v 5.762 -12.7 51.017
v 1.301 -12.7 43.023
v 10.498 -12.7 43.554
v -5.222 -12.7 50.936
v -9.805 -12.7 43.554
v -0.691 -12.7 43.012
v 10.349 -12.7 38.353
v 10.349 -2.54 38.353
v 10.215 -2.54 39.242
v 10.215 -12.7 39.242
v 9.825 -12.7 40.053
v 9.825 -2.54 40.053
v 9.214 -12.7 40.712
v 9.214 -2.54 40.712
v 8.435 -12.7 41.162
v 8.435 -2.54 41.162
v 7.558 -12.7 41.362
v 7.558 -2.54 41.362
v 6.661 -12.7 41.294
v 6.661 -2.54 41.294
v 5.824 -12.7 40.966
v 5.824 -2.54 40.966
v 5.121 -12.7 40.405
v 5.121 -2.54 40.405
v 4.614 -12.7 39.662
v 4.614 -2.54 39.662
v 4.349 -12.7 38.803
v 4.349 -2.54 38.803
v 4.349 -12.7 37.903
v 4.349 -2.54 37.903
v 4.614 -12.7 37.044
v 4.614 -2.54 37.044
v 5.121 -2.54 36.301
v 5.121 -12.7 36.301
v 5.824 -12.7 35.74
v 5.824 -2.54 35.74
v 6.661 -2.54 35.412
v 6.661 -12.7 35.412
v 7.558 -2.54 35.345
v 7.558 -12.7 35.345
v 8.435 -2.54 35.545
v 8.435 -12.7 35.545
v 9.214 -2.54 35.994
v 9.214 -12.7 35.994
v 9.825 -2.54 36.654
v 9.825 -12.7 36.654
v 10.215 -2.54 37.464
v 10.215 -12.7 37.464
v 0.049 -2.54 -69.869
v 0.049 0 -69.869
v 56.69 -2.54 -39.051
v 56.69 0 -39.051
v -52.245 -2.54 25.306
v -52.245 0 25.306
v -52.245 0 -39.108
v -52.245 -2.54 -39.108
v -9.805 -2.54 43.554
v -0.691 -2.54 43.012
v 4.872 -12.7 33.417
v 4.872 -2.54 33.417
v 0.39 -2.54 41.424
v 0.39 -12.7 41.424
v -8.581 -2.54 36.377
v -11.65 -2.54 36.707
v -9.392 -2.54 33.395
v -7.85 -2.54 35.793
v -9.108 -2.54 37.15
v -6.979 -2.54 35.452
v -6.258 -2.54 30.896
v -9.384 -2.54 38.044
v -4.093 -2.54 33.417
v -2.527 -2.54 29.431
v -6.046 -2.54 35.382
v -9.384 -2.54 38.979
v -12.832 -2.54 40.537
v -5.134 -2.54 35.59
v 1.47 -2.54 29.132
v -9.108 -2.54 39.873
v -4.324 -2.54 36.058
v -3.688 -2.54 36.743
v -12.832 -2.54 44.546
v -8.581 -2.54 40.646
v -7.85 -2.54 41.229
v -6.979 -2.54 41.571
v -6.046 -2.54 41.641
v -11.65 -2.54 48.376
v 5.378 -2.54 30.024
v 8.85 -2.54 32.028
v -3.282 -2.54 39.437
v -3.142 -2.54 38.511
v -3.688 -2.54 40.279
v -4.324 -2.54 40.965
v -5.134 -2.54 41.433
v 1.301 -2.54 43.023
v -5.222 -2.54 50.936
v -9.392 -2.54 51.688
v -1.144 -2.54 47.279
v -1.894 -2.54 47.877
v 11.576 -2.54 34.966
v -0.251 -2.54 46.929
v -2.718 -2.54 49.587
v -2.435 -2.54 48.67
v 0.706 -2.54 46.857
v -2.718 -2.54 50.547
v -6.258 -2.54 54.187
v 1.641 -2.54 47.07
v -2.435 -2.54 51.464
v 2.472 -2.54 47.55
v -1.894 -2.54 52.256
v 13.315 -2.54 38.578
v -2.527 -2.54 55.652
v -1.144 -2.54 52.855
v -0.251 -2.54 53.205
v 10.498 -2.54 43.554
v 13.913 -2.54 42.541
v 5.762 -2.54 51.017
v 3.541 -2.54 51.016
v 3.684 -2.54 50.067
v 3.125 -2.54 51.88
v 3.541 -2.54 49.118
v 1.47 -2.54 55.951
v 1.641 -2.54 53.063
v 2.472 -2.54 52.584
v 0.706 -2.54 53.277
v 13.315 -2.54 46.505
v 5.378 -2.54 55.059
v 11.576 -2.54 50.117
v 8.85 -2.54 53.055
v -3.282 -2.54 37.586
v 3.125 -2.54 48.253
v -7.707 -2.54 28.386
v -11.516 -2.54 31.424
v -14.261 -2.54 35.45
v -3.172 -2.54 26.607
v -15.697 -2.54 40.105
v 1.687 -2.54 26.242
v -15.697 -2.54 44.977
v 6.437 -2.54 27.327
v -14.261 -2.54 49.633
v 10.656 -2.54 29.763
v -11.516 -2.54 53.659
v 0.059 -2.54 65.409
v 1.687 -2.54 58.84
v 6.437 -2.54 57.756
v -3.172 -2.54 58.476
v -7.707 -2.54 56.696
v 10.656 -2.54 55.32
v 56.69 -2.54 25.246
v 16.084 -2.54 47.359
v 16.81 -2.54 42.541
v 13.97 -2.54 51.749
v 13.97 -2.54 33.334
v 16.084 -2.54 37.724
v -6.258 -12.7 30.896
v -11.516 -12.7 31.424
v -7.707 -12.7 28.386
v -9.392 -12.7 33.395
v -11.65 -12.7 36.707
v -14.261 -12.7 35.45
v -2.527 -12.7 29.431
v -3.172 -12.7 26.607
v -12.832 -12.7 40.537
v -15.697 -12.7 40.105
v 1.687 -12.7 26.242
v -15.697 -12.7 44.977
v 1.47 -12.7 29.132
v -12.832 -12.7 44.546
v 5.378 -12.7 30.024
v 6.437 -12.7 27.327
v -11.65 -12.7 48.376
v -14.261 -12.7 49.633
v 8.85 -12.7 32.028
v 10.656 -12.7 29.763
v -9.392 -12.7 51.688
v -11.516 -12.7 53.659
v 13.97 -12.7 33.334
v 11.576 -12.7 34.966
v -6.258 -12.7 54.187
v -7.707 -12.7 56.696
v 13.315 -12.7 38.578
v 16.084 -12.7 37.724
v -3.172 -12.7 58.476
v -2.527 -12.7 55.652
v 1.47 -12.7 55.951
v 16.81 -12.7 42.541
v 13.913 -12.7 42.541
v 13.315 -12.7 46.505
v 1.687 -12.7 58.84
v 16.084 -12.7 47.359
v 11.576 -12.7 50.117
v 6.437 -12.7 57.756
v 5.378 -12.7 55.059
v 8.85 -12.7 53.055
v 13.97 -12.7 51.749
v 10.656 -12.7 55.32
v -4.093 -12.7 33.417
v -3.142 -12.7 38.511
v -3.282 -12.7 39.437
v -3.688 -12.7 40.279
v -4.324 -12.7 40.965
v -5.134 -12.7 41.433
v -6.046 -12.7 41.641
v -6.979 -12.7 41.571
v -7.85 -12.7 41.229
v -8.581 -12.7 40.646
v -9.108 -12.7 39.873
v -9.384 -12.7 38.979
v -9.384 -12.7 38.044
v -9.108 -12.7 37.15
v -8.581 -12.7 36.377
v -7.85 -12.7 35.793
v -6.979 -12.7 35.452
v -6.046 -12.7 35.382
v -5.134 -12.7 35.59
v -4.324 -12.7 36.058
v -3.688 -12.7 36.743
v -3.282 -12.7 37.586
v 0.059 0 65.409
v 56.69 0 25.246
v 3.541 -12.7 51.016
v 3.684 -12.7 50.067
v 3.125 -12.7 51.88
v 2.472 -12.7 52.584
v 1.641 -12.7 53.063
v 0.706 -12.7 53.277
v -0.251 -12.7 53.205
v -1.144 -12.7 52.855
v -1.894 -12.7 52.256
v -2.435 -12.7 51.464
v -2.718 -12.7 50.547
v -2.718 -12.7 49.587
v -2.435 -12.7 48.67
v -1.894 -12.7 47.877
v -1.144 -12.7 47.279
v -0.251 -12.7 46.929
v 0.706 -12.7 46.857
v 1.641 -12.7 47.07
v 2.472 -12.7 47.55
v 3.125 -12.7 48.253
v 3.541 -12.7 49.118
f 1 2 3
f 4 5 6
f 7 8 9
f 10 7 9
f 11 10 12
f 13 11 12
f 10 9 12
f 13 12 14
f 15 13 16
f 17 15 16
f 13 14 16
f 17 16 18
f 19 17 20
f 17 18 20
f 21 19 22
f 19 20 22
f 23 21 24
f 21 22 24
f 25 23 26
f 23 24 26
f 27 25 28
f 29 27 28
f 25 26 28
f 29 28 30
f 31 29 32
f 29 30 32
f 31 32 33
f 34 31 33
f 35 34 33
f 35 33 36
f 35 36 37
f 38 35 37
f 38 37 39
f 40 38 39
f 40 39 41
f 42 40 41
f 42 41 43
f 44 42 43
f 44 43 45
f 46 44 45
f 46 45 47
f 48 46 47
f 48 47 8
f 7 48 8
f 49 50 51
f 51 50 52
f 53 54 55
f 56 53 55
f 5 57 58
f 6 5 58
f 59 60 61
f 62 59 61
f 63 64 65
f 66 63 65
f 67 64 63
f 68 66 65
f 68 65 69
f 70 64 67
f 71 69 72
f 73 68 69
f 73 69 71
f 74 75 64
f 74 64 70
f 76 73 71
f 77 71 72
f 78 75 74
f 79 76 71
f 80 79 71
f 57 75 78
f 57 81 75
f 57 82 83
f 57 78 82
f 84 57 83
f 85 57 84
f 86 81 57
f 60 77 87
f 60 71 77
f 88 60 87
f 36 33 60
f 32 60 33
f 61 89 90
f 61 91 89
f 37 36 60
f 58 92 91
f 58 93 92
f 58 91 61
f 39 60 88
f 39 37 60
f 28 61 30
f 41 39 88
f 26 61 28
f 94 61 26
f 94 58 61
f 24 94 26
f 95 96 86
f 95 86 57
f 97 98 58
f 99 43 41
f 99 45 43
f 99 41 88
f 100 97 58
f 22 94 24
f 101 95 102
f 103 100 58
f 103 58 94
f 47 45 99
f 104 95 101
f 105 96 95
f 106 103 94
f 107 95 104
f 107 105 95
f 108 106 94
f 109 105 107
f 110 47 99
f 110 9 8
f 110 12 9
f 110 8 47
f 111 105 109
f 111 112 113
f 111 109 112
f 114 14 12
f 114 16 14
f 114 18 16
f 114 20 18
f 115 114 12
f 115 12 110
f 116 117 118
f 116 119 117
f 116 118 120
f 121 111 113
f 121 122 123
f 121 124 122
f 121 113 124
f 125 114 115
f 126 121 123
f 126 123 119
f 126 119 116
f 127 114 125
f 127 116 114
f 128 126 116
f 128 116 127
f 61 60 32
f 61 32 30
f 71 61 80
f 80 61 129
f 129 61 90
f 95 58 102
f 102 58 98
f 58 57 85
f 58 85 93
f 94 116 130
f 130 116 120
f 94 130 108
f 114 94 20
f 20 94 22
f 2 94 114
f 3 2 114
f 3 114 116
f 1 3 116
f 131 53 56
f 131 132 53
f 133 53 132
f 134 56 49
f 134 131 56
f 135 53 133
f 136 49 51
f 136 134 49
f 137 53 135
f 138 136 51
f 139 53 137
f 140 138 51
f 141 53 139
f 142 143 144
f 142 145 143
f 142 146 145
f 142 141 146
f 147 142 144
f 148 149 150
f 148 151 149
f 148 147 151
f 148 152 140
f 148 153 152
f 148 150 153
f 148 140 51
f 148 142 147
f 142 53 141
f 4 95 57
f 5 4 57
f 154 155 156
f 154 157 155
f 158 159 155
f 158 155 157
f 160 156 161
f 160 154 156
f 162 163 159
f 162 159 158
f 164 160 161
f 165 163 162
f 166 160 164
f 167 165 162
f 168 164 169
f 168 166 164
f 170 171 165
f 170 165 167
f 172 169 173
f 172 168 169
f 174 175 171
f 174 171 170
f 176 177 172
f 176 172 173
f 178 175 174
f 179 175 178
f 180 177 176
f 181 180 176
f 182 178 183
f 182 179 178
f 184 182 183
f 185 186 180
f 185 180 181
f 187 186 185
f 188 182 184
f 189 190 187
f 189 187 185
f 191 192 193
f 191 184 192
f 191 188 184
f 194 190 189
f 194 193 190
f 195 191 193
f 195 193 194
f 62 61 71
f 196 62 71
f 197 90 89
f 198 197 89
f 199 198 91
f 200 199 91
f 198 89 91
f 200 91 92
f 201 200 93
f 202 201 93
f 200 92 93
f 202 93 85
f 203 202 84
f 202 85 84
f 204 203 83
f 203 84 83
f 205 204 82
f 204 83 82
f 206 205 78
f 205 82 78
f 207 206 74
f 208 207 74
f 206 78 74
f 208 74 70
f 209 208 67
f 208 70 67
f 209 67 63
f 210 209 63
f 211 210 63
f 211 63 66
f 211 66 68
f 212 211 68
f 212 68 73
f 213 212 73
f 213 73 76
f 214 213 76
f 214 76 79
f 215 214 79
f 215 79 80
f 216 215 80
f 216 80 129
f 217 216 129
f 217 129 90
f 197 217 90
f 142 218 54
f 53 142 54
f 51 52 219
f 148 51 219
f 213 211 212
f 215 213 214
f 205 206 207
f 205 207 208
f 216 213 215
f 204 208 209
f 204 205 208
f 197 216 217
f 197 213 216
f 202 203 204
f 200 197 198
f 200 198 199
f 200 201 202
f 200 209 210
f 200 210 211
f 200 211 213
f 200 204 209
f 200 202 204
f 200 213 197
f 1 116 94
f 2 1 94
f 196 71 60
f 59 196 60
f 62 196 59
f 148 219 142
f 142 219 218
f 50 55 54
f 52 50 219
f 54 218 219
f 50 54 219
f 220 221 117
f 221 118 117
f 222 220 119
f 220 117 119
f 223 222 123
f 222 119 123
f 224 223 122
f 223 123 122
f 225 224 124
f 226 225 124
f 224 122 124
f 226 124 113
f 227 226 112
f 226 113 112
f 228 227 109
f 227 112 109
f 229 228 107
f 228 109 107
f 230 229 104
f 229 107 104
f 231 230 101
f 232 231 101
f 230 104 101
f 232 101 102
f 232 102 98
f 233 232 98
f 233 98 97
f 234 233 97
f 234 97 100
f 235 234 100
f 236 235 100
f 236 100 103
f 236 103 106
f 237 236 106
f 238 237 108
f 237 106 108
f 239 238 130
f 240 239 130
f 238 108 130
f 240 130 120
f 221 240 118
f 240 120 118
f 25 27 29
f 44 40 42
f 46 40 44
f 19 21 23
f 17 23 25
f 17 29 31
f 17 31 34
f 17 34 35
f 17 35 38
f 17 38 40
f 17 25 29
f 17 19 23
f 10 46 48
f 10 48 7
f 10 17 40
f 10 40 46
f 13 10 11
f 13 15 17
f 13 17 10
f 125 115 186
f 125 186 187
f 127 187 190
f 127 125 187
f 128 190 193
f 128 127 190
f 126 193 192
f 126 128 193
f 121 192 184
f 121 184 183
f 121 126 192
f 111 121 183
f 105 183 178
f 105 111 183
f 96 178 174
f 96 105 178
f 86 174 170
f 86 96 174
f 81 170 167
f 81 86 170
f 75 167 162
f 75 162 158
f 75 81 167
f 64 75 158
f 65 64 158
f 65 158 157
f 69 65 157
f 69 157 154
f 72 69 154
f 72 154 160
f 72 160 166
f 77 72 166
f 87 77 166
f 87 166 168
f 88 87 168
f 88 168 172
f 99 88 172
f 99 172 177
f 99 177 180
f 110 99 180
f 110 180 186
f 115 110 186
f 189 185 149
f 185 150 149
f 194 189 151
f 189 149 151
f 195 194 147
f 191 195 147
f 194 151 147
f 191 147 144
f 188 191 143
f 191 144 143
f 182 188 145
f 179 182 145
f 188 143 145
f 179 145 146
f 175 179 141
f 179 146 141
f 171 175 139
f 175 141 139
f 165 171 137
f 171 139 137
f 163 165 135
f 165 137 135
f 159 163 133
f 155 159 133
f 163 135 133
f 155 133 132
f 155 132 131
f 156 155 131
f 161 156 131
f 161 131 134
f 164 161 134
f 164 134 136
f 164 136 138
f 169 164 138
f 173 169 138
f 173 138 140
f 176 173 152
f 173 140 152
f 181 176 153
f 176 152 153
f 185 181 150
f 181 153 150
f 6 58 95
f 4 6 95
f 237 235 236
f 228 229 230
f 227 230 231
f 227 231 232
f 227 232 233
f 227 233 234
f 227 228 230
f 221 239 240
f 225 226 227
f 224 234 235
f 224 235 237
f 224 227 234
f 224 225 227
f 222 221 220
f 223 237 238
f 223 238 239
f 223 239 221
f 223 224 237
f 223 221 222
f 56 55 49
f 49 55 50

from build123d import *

# Parameters (mm, degrees)
F1_DEPTH  = 12.7
F2_DEPTH  = 2.54
F3_DEPTH  = 7.62
F4_DEPTH  = 2.54
F5_DEPTH  = 2.54
F6_DEPTH  = 2.54
F7_DEPTH  = 2.54
F8_DEPTH  = 2.54
F9_DEPTH  = 2.54
F10_R     = 16.3446931482
F10_R_2   = 13.4473820184
F10_R_3   = 3.0169302384
F10_R_4   = 3.1385421842
F10_R_5   = 3.2190410071
F11_DEPTH = 25.4
F12_DEPTH = 19.05
F13_DEPTH = 6.35
F14_DEPTH = 2.54
F15_DEPTH = 2.54
F16_DEPTH = 2.54


with BuildPart() as f1:
    # F0 (on Front) → F1 (new body)
    with BuildSketch(Plane.XZ):
        Polygon((59.2296272516, 26.558874175), (0, 68.5641244054), (-54.7846257687, 26.558874175), (-54.7846257687, -40.5606217682), (0, -72.7868750691), (59.2296272516, -40.5606217682), align=None)
    extrude(amount=F1_DEPTH)

    # F2 (cut): a face of the model
    f2_faces = [f1.faces().sort_by_distance(p)[0] for p in [
        (1.9587071028, -12.7, -4.2659517496),
    ]]
    extrude(f2_faces, amount=-F2_DEPTH, mode=Mode.SUBTRACT)

    # F3 (cut): a face of the model
    f3_faces = [f1.faces().sort_by_distance(p)[0] for p in [
        (1.9587071028, -10.16, -4.2659517496),
    ]]
    extrude(f3_faces, amount=-F3_DEPTH, mode=Mode.SUBTRACT)

    # F4 (cut): a face of the model
    f4_faces = [f1.faces().sort_by_distance(p)[0] for p in [
        (29.6148136258, -1.27, 47.5614992902),
    ]]
    extrude(f4_faces, amount=-F4_DEPTH, mode=Mode.SUBTRACT)

    # F5 (cut): a face of the model
    f5_faces = [f1.faces().sort_by_distance(p)[0] for p in [
        (-27.3923128843, -1.27, 47.5614992902),
    ]]
    extrude(f5_faces, amount=-F5_DEPTH, mode=Mode.SUBTRACT)

    # F6 (cut): a face of the model
    f6_faces = [f1.faces().sort_by_distance(p)[0] for p in [
        (59.2296272516, -1.27, -7.0008737966),
    ]]
    extrude(f6_faces, amount=-F6_DEPTH, mode=Mode.SUBTRACT)

    # F7 (cut): a face of the model
    f7_faces = [f1.faces().sort_by_distance(p)[0] for p in [
        (-54.7846257687, -1.27, -7.0008737966),
    ]]
    extrude(f7_faces, amount=-F7_DEPTH, mode=Mode.SUBTRACT)

    # F8 (cut): a face of the model
    f8_faces = [f1.faces().sort_by_distance(p)[0] for p in [
        (-27.3923128843, -1.27, -56.6737484187),
    ]]
    extrude(f8_faces, amount=-F8_DEPTH, mode=Mode.SUBTRACT)

    # F9 (cut): a face of the model
    f9_faces = [f1.faces().sort_by_distance(p)[0] for p in [
        (29.6148136258, -1.27, -56.6737484187),
    ]]
    extrude(f9_faces, amount=-F9_DEPTH, mode=Mode.SUBTRACT)

    # F10 (on face) → F11 (join)
    with BuildSketch(Plane.XZ.offset(2.54)):
        with Locations((0.4653159413, 42.5413995981)):
            Circle(F10_R)
        with Locations((0.4653159413, 42.5413995981)):
            Circle(F10_R_2, mode=Mode.SUBTRACT)
        Polygon((5.7624652982, 51.0174520314), (1.3005869696, 43.022621423), (10.498451069, 43.5544140637), align=None)
        with Locations((7.332497742, 38.3531376719)):
            Circle(F10_R_3)
        Polygon((4.8724082299, 33.4170944989), (0.3896932758, 41.4243862033), (-4.0930220857, 33.4170944989), align=None)
        with Locations((-6.2807253562, 38.5114327073)):
            Circle(F10_R_4)
        Polygon((-5.2216826007, 50.936318934), (-9.8047619686, 43.5544140637), (-0.6910812808, 43.0121421814), align=None)
        with Locations((0.4653159413, 50.0668436289)):
            Circle(F10_R_5)
    extrude(amount=F11_DEPTH)

    # F12 (cut): faces of the model
    f12_faces = [f1.faces().sort_by_distance(p)[0] for p in [
        (-15.4170794725, -27.94, 42.5413995981),
        (0.38969314, -27.94, 36.0861917337),
        (7.332497742, -27.94, 38.3531376719),
        (5.8538344456, -27.94, 45.8648291727),
        (-5.2391752834, -27.94, 45.8342917264),
        (-6.2807253562, -27.94, 38.5114327073),
        (0.4653159413, -27.94, 50.0668436289),
    ]]
    extrude(f12_faces, amount=-F12_DEPTH, mode=Mode.SUBTRACT)

    # F13 (add): faces of the model
    f13_faces = [f1.faces().sort_by_distance(p)[0] for p in [
        (-15.4170794725, -8.89, 42.5413995981),
        (7.332497742, -8.89, 38.3531376719),
        (5.8538344456, -8.89, 45.8648291727),
        (0.4653159413, -8.89, 50.0668436289),
        (-5.2391752834, -8.89, 45.8342917264),
        (-6.2807253562, -8.89, 38.5114327073),
        (0.38969314, -8.89, 36.0861917337),
    ]]
    extrude(f13_faces, amount=F13_DEPTH)

    # F14 (cut): faces of the model
    f14_faces = [f1.faces().sort_by_distance(p)[0] for p in [
        (-15.4170794725, -15.24, 42.5413995981),
        (7.332497742, -15.24, 38.3531376719),
        (5.8538344456, -15.24, 45.8648291727),
        (0.4653159413, -15.24, 50.0668436289),
        (-5.2391752834, -15.24, 45.8342917264),
        (-6.2807253562, -15.24, 38.5114327073),
        (0.38969314, -15.24, 36.0861917337),
    ]]
    extrude(f14_faces, amount=-F14_DEPTH, mode=Mode.SUBTRACT)

    # F15 (cut): faces of the model
    f15_faces = [f1.faces().sort_by_distance(p)[0] for p in [
        (5.8538344456, -12.7, 45.8648291727),
        (0.4653159413, -12.7, 50.0668436289),
        (7.332497742, -12.7, 38.3531376719),
        (0.38969314, -12.7, 36.0861917337),
        (-5.2391752834, -12.7, 45.8342917264),
        (-6.2807253562, -12.7, 38.5114327073),
        (-15.4170794725, -12.7, 42.5413995981),
    ]]
    extrude(f15_faces, amount=-F15_DEPTH, mode=Mode.SUBTRACT)

    # F16 (add): faces of the model
    f16_faces = [f1.faces().sort_by_distance(p)[0] for p in [
        (0.4653159413, -10.16, 50.0668436289),
        (5.8538344456, -10.16, 45.8648291727),
        (7.332497742, -10.16, 38.3531376719),
        (0.38969314, -10.16, 36.0861917337),
        (-5.2391752834, -10.16, 45.8342917264),
        (-6.2807253562, -10.16, 38.5114327073),
        (-15.4170794725, -10.16, 42.5413995981),
    ]]
    extrude(f16_faces, amount=F16_DEPTH)


solid = f1.part
